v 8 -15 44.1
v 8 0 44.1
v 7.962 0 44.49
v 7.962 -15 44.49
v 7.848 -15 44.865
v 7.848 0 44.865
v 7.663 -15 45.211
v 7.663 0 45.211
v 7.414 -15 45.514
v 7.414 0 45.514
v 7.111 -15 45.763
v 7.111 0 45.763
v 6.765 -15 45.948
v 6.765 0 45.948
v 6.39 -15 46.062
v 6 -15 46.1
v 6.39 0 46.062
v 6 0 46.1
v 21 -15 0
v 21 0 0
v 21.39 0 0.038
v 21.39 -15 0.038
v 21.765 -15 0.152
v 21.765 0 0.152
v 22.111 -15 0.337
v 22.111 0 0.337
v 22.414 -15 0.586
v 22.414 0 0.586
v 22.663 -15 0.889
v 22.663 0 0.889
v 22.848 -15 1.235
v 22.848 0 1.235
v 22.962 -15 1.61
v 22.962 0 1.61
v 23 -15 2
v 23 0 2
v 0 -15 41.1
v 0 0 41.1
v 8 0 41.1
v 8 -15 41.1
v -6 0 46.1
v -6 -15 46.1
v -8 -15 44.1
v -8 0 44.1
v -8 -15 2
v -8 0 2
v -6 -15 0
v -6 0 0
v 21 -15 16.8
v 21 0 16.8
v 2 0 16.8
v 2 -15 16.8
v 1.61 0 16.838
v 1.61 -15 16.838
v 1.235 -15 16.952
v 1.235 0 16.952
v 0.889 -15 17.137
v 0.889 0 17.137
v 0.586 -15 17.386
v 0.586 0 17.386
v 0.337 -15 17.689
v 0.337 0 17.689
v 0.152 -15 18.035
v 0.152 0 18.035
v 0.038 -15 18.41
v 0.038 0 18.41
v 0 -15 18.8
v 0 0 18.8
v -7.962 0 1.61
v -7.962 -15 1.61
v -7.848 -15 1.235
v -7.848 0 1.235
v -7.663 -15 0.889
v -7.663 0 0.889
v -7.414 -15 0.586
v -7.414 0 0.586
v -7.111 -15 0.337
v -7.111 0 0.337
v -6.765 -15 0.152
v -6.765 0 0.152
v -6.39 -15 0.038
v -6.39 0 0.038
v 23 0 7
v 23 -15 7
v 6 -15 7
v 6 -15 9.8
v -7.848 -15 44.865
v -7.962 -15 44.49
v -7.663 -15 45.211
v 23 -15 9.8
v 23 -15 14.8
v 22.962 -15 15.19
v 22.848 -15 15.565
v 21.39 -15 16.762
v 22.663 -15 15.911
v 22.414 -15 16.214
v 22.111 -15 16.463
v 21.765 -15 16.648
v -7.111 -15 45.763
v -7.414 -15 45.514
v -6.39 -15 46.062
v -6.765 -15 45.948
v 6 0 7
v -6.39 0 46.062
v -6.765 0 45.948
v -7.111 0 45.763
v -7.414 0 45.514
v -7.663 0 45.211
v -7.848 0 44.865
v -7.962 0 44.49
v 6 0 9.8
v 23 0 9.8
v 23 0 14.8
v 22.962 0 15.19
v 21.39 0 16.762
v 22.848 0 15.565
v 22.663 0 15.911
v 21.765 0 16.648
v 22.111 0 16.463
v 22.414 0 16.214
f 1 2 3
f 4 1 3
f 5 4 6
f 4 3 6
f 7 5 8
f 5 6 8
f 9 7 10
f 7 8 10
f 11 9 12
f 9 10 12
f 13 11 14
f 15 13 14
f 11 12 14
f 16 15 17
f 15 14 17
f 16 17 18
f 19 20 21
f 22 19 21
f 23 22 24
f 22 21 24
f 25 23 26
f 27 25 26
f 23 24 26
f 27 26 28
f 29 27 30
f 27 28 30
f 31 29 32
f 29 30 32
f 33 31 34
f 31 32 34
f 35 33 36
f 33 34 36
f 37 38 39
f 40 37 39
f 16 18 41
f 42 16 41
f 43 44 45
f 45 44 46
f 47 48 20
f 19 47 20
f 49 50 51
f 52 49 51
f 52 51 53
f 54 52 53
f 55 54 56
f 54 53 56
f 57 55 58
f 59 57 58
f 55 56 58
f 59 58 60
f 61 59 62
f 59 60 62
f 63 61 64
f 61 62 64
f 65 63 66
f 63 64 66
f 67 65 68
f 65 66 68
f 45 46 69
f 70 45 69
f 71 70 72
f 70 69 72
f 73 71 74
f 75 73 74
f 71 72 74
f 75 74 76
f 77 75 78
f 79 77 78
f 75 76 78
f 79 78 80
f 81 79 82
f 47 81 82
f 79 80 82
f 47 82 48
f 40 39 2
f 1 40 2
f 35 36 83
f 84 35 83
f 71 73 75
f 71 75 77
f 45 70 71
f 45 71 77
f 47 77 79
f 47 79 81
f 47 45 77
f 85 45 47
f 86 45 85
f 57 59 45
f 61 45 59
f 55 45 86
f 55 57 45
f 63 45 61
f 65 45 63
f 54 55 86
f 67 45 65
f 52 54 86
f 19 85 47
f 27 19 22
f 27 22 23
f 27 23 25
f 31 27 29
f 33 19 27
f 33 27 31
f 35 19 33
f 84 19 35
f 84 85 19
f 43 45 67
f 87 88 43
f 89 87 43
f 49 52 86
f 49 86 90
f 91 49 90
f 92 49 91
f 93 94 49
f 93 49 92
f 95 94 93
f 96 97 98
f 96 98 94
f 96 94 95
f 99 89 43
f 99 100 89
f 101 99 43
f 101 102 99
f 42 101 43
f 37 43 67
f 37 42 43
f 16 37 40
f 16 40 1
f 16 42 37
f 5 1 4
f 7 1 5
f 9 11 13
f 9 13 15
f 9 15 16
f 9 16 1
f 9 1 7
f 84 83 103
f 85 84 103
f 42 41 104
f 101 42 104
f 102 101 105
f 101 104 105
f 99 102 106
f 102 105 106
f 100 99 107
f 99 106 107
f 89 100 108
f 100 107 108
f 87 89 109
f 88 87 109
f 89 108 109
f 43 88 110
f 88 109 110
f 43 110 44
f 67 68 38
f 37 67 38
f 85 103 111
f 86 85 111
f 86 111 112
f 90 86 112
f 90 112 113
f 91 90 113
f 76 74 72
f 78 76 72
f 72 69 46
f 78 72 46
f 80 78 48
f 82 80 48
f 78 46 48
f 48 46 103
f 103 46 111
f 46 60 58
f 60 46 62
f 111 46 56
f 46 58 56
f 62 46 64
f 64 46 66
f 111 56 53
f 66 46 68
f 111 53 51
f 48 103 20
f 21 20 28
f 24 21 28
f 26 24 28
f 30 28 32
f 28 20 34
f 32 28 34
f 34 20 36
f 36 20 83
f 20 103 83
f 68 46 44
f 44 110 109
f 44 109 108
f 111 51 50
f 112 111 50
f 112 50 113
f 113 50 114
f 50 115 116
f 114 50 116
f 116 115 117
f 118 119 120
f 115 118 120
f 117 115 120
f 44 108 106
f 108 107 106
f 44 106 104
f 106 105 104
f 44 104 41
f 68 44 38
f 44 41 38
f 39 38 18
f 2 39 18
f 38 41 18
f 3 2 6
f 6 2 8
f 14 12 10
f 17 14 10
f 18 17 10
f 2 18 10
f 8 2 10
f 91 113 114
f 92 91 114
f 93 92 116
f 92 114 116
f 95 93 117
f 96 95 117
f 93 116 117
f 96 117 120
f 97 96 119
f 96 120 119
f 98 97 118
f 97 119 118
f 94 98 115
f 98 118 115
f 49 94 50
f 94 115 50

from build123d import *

# Parameters (mm, degrees)
F1_DEPTH = 15


with BuildPart() as f1:
    # F0 (on Front) → F1 (new body)
    with BuildSketch(Plane.XZ):
        with BuildLine():
            Line((-6, 0), (0, 0))
            Line((0, 0), (21, 0))
            ThreePointArc((21, 0), (22.414214, 0.585786), (23, 2))
            Line((23, 2), (23, 7))
            Line((23, 7), (6, 7))
            Line((6, 7), (6, 9.8))
            Line((6, 9.8), (23, 9.8))
            Line((23, 9.8), (23, 14.8))
            ThreePointArc((23, 14.8), (22.414214, 16.214214), (21, 16.8))
            Line((21, 16.8), (2, 16.8))
            ThreePointArc((2, 16.8), (0.585786, 17.385786), (0, 18.8))
            Line((0, 18.8), (0, 29.8))
            Line((0, 29.8), (0, 36.8))
            Line((0, 36.8), (0, 41.1))
            Line((0, 41.1), (8, 41.1))
            Line((8, 41.1), (8, 44.1))
            ThreePointArc((8, 44.1), (7.414214, 45.514214), (6, 46.1))
            Line((6, 46.1), (0, 46.1))
            Line((0, 46.1), (-6, 46.1))
            ThreePointArc((-6, 46.1), (-7.414214, 45.514214), (-8, 44.1))
            Line((-8, 44.1), (-8, 2))
            ThreePointArc((-8, 2), (-7.414214, 0.585786), (-6, 0))
        make_face()
    extrude(amount=F1_DEPTH)


solid = f1.part
